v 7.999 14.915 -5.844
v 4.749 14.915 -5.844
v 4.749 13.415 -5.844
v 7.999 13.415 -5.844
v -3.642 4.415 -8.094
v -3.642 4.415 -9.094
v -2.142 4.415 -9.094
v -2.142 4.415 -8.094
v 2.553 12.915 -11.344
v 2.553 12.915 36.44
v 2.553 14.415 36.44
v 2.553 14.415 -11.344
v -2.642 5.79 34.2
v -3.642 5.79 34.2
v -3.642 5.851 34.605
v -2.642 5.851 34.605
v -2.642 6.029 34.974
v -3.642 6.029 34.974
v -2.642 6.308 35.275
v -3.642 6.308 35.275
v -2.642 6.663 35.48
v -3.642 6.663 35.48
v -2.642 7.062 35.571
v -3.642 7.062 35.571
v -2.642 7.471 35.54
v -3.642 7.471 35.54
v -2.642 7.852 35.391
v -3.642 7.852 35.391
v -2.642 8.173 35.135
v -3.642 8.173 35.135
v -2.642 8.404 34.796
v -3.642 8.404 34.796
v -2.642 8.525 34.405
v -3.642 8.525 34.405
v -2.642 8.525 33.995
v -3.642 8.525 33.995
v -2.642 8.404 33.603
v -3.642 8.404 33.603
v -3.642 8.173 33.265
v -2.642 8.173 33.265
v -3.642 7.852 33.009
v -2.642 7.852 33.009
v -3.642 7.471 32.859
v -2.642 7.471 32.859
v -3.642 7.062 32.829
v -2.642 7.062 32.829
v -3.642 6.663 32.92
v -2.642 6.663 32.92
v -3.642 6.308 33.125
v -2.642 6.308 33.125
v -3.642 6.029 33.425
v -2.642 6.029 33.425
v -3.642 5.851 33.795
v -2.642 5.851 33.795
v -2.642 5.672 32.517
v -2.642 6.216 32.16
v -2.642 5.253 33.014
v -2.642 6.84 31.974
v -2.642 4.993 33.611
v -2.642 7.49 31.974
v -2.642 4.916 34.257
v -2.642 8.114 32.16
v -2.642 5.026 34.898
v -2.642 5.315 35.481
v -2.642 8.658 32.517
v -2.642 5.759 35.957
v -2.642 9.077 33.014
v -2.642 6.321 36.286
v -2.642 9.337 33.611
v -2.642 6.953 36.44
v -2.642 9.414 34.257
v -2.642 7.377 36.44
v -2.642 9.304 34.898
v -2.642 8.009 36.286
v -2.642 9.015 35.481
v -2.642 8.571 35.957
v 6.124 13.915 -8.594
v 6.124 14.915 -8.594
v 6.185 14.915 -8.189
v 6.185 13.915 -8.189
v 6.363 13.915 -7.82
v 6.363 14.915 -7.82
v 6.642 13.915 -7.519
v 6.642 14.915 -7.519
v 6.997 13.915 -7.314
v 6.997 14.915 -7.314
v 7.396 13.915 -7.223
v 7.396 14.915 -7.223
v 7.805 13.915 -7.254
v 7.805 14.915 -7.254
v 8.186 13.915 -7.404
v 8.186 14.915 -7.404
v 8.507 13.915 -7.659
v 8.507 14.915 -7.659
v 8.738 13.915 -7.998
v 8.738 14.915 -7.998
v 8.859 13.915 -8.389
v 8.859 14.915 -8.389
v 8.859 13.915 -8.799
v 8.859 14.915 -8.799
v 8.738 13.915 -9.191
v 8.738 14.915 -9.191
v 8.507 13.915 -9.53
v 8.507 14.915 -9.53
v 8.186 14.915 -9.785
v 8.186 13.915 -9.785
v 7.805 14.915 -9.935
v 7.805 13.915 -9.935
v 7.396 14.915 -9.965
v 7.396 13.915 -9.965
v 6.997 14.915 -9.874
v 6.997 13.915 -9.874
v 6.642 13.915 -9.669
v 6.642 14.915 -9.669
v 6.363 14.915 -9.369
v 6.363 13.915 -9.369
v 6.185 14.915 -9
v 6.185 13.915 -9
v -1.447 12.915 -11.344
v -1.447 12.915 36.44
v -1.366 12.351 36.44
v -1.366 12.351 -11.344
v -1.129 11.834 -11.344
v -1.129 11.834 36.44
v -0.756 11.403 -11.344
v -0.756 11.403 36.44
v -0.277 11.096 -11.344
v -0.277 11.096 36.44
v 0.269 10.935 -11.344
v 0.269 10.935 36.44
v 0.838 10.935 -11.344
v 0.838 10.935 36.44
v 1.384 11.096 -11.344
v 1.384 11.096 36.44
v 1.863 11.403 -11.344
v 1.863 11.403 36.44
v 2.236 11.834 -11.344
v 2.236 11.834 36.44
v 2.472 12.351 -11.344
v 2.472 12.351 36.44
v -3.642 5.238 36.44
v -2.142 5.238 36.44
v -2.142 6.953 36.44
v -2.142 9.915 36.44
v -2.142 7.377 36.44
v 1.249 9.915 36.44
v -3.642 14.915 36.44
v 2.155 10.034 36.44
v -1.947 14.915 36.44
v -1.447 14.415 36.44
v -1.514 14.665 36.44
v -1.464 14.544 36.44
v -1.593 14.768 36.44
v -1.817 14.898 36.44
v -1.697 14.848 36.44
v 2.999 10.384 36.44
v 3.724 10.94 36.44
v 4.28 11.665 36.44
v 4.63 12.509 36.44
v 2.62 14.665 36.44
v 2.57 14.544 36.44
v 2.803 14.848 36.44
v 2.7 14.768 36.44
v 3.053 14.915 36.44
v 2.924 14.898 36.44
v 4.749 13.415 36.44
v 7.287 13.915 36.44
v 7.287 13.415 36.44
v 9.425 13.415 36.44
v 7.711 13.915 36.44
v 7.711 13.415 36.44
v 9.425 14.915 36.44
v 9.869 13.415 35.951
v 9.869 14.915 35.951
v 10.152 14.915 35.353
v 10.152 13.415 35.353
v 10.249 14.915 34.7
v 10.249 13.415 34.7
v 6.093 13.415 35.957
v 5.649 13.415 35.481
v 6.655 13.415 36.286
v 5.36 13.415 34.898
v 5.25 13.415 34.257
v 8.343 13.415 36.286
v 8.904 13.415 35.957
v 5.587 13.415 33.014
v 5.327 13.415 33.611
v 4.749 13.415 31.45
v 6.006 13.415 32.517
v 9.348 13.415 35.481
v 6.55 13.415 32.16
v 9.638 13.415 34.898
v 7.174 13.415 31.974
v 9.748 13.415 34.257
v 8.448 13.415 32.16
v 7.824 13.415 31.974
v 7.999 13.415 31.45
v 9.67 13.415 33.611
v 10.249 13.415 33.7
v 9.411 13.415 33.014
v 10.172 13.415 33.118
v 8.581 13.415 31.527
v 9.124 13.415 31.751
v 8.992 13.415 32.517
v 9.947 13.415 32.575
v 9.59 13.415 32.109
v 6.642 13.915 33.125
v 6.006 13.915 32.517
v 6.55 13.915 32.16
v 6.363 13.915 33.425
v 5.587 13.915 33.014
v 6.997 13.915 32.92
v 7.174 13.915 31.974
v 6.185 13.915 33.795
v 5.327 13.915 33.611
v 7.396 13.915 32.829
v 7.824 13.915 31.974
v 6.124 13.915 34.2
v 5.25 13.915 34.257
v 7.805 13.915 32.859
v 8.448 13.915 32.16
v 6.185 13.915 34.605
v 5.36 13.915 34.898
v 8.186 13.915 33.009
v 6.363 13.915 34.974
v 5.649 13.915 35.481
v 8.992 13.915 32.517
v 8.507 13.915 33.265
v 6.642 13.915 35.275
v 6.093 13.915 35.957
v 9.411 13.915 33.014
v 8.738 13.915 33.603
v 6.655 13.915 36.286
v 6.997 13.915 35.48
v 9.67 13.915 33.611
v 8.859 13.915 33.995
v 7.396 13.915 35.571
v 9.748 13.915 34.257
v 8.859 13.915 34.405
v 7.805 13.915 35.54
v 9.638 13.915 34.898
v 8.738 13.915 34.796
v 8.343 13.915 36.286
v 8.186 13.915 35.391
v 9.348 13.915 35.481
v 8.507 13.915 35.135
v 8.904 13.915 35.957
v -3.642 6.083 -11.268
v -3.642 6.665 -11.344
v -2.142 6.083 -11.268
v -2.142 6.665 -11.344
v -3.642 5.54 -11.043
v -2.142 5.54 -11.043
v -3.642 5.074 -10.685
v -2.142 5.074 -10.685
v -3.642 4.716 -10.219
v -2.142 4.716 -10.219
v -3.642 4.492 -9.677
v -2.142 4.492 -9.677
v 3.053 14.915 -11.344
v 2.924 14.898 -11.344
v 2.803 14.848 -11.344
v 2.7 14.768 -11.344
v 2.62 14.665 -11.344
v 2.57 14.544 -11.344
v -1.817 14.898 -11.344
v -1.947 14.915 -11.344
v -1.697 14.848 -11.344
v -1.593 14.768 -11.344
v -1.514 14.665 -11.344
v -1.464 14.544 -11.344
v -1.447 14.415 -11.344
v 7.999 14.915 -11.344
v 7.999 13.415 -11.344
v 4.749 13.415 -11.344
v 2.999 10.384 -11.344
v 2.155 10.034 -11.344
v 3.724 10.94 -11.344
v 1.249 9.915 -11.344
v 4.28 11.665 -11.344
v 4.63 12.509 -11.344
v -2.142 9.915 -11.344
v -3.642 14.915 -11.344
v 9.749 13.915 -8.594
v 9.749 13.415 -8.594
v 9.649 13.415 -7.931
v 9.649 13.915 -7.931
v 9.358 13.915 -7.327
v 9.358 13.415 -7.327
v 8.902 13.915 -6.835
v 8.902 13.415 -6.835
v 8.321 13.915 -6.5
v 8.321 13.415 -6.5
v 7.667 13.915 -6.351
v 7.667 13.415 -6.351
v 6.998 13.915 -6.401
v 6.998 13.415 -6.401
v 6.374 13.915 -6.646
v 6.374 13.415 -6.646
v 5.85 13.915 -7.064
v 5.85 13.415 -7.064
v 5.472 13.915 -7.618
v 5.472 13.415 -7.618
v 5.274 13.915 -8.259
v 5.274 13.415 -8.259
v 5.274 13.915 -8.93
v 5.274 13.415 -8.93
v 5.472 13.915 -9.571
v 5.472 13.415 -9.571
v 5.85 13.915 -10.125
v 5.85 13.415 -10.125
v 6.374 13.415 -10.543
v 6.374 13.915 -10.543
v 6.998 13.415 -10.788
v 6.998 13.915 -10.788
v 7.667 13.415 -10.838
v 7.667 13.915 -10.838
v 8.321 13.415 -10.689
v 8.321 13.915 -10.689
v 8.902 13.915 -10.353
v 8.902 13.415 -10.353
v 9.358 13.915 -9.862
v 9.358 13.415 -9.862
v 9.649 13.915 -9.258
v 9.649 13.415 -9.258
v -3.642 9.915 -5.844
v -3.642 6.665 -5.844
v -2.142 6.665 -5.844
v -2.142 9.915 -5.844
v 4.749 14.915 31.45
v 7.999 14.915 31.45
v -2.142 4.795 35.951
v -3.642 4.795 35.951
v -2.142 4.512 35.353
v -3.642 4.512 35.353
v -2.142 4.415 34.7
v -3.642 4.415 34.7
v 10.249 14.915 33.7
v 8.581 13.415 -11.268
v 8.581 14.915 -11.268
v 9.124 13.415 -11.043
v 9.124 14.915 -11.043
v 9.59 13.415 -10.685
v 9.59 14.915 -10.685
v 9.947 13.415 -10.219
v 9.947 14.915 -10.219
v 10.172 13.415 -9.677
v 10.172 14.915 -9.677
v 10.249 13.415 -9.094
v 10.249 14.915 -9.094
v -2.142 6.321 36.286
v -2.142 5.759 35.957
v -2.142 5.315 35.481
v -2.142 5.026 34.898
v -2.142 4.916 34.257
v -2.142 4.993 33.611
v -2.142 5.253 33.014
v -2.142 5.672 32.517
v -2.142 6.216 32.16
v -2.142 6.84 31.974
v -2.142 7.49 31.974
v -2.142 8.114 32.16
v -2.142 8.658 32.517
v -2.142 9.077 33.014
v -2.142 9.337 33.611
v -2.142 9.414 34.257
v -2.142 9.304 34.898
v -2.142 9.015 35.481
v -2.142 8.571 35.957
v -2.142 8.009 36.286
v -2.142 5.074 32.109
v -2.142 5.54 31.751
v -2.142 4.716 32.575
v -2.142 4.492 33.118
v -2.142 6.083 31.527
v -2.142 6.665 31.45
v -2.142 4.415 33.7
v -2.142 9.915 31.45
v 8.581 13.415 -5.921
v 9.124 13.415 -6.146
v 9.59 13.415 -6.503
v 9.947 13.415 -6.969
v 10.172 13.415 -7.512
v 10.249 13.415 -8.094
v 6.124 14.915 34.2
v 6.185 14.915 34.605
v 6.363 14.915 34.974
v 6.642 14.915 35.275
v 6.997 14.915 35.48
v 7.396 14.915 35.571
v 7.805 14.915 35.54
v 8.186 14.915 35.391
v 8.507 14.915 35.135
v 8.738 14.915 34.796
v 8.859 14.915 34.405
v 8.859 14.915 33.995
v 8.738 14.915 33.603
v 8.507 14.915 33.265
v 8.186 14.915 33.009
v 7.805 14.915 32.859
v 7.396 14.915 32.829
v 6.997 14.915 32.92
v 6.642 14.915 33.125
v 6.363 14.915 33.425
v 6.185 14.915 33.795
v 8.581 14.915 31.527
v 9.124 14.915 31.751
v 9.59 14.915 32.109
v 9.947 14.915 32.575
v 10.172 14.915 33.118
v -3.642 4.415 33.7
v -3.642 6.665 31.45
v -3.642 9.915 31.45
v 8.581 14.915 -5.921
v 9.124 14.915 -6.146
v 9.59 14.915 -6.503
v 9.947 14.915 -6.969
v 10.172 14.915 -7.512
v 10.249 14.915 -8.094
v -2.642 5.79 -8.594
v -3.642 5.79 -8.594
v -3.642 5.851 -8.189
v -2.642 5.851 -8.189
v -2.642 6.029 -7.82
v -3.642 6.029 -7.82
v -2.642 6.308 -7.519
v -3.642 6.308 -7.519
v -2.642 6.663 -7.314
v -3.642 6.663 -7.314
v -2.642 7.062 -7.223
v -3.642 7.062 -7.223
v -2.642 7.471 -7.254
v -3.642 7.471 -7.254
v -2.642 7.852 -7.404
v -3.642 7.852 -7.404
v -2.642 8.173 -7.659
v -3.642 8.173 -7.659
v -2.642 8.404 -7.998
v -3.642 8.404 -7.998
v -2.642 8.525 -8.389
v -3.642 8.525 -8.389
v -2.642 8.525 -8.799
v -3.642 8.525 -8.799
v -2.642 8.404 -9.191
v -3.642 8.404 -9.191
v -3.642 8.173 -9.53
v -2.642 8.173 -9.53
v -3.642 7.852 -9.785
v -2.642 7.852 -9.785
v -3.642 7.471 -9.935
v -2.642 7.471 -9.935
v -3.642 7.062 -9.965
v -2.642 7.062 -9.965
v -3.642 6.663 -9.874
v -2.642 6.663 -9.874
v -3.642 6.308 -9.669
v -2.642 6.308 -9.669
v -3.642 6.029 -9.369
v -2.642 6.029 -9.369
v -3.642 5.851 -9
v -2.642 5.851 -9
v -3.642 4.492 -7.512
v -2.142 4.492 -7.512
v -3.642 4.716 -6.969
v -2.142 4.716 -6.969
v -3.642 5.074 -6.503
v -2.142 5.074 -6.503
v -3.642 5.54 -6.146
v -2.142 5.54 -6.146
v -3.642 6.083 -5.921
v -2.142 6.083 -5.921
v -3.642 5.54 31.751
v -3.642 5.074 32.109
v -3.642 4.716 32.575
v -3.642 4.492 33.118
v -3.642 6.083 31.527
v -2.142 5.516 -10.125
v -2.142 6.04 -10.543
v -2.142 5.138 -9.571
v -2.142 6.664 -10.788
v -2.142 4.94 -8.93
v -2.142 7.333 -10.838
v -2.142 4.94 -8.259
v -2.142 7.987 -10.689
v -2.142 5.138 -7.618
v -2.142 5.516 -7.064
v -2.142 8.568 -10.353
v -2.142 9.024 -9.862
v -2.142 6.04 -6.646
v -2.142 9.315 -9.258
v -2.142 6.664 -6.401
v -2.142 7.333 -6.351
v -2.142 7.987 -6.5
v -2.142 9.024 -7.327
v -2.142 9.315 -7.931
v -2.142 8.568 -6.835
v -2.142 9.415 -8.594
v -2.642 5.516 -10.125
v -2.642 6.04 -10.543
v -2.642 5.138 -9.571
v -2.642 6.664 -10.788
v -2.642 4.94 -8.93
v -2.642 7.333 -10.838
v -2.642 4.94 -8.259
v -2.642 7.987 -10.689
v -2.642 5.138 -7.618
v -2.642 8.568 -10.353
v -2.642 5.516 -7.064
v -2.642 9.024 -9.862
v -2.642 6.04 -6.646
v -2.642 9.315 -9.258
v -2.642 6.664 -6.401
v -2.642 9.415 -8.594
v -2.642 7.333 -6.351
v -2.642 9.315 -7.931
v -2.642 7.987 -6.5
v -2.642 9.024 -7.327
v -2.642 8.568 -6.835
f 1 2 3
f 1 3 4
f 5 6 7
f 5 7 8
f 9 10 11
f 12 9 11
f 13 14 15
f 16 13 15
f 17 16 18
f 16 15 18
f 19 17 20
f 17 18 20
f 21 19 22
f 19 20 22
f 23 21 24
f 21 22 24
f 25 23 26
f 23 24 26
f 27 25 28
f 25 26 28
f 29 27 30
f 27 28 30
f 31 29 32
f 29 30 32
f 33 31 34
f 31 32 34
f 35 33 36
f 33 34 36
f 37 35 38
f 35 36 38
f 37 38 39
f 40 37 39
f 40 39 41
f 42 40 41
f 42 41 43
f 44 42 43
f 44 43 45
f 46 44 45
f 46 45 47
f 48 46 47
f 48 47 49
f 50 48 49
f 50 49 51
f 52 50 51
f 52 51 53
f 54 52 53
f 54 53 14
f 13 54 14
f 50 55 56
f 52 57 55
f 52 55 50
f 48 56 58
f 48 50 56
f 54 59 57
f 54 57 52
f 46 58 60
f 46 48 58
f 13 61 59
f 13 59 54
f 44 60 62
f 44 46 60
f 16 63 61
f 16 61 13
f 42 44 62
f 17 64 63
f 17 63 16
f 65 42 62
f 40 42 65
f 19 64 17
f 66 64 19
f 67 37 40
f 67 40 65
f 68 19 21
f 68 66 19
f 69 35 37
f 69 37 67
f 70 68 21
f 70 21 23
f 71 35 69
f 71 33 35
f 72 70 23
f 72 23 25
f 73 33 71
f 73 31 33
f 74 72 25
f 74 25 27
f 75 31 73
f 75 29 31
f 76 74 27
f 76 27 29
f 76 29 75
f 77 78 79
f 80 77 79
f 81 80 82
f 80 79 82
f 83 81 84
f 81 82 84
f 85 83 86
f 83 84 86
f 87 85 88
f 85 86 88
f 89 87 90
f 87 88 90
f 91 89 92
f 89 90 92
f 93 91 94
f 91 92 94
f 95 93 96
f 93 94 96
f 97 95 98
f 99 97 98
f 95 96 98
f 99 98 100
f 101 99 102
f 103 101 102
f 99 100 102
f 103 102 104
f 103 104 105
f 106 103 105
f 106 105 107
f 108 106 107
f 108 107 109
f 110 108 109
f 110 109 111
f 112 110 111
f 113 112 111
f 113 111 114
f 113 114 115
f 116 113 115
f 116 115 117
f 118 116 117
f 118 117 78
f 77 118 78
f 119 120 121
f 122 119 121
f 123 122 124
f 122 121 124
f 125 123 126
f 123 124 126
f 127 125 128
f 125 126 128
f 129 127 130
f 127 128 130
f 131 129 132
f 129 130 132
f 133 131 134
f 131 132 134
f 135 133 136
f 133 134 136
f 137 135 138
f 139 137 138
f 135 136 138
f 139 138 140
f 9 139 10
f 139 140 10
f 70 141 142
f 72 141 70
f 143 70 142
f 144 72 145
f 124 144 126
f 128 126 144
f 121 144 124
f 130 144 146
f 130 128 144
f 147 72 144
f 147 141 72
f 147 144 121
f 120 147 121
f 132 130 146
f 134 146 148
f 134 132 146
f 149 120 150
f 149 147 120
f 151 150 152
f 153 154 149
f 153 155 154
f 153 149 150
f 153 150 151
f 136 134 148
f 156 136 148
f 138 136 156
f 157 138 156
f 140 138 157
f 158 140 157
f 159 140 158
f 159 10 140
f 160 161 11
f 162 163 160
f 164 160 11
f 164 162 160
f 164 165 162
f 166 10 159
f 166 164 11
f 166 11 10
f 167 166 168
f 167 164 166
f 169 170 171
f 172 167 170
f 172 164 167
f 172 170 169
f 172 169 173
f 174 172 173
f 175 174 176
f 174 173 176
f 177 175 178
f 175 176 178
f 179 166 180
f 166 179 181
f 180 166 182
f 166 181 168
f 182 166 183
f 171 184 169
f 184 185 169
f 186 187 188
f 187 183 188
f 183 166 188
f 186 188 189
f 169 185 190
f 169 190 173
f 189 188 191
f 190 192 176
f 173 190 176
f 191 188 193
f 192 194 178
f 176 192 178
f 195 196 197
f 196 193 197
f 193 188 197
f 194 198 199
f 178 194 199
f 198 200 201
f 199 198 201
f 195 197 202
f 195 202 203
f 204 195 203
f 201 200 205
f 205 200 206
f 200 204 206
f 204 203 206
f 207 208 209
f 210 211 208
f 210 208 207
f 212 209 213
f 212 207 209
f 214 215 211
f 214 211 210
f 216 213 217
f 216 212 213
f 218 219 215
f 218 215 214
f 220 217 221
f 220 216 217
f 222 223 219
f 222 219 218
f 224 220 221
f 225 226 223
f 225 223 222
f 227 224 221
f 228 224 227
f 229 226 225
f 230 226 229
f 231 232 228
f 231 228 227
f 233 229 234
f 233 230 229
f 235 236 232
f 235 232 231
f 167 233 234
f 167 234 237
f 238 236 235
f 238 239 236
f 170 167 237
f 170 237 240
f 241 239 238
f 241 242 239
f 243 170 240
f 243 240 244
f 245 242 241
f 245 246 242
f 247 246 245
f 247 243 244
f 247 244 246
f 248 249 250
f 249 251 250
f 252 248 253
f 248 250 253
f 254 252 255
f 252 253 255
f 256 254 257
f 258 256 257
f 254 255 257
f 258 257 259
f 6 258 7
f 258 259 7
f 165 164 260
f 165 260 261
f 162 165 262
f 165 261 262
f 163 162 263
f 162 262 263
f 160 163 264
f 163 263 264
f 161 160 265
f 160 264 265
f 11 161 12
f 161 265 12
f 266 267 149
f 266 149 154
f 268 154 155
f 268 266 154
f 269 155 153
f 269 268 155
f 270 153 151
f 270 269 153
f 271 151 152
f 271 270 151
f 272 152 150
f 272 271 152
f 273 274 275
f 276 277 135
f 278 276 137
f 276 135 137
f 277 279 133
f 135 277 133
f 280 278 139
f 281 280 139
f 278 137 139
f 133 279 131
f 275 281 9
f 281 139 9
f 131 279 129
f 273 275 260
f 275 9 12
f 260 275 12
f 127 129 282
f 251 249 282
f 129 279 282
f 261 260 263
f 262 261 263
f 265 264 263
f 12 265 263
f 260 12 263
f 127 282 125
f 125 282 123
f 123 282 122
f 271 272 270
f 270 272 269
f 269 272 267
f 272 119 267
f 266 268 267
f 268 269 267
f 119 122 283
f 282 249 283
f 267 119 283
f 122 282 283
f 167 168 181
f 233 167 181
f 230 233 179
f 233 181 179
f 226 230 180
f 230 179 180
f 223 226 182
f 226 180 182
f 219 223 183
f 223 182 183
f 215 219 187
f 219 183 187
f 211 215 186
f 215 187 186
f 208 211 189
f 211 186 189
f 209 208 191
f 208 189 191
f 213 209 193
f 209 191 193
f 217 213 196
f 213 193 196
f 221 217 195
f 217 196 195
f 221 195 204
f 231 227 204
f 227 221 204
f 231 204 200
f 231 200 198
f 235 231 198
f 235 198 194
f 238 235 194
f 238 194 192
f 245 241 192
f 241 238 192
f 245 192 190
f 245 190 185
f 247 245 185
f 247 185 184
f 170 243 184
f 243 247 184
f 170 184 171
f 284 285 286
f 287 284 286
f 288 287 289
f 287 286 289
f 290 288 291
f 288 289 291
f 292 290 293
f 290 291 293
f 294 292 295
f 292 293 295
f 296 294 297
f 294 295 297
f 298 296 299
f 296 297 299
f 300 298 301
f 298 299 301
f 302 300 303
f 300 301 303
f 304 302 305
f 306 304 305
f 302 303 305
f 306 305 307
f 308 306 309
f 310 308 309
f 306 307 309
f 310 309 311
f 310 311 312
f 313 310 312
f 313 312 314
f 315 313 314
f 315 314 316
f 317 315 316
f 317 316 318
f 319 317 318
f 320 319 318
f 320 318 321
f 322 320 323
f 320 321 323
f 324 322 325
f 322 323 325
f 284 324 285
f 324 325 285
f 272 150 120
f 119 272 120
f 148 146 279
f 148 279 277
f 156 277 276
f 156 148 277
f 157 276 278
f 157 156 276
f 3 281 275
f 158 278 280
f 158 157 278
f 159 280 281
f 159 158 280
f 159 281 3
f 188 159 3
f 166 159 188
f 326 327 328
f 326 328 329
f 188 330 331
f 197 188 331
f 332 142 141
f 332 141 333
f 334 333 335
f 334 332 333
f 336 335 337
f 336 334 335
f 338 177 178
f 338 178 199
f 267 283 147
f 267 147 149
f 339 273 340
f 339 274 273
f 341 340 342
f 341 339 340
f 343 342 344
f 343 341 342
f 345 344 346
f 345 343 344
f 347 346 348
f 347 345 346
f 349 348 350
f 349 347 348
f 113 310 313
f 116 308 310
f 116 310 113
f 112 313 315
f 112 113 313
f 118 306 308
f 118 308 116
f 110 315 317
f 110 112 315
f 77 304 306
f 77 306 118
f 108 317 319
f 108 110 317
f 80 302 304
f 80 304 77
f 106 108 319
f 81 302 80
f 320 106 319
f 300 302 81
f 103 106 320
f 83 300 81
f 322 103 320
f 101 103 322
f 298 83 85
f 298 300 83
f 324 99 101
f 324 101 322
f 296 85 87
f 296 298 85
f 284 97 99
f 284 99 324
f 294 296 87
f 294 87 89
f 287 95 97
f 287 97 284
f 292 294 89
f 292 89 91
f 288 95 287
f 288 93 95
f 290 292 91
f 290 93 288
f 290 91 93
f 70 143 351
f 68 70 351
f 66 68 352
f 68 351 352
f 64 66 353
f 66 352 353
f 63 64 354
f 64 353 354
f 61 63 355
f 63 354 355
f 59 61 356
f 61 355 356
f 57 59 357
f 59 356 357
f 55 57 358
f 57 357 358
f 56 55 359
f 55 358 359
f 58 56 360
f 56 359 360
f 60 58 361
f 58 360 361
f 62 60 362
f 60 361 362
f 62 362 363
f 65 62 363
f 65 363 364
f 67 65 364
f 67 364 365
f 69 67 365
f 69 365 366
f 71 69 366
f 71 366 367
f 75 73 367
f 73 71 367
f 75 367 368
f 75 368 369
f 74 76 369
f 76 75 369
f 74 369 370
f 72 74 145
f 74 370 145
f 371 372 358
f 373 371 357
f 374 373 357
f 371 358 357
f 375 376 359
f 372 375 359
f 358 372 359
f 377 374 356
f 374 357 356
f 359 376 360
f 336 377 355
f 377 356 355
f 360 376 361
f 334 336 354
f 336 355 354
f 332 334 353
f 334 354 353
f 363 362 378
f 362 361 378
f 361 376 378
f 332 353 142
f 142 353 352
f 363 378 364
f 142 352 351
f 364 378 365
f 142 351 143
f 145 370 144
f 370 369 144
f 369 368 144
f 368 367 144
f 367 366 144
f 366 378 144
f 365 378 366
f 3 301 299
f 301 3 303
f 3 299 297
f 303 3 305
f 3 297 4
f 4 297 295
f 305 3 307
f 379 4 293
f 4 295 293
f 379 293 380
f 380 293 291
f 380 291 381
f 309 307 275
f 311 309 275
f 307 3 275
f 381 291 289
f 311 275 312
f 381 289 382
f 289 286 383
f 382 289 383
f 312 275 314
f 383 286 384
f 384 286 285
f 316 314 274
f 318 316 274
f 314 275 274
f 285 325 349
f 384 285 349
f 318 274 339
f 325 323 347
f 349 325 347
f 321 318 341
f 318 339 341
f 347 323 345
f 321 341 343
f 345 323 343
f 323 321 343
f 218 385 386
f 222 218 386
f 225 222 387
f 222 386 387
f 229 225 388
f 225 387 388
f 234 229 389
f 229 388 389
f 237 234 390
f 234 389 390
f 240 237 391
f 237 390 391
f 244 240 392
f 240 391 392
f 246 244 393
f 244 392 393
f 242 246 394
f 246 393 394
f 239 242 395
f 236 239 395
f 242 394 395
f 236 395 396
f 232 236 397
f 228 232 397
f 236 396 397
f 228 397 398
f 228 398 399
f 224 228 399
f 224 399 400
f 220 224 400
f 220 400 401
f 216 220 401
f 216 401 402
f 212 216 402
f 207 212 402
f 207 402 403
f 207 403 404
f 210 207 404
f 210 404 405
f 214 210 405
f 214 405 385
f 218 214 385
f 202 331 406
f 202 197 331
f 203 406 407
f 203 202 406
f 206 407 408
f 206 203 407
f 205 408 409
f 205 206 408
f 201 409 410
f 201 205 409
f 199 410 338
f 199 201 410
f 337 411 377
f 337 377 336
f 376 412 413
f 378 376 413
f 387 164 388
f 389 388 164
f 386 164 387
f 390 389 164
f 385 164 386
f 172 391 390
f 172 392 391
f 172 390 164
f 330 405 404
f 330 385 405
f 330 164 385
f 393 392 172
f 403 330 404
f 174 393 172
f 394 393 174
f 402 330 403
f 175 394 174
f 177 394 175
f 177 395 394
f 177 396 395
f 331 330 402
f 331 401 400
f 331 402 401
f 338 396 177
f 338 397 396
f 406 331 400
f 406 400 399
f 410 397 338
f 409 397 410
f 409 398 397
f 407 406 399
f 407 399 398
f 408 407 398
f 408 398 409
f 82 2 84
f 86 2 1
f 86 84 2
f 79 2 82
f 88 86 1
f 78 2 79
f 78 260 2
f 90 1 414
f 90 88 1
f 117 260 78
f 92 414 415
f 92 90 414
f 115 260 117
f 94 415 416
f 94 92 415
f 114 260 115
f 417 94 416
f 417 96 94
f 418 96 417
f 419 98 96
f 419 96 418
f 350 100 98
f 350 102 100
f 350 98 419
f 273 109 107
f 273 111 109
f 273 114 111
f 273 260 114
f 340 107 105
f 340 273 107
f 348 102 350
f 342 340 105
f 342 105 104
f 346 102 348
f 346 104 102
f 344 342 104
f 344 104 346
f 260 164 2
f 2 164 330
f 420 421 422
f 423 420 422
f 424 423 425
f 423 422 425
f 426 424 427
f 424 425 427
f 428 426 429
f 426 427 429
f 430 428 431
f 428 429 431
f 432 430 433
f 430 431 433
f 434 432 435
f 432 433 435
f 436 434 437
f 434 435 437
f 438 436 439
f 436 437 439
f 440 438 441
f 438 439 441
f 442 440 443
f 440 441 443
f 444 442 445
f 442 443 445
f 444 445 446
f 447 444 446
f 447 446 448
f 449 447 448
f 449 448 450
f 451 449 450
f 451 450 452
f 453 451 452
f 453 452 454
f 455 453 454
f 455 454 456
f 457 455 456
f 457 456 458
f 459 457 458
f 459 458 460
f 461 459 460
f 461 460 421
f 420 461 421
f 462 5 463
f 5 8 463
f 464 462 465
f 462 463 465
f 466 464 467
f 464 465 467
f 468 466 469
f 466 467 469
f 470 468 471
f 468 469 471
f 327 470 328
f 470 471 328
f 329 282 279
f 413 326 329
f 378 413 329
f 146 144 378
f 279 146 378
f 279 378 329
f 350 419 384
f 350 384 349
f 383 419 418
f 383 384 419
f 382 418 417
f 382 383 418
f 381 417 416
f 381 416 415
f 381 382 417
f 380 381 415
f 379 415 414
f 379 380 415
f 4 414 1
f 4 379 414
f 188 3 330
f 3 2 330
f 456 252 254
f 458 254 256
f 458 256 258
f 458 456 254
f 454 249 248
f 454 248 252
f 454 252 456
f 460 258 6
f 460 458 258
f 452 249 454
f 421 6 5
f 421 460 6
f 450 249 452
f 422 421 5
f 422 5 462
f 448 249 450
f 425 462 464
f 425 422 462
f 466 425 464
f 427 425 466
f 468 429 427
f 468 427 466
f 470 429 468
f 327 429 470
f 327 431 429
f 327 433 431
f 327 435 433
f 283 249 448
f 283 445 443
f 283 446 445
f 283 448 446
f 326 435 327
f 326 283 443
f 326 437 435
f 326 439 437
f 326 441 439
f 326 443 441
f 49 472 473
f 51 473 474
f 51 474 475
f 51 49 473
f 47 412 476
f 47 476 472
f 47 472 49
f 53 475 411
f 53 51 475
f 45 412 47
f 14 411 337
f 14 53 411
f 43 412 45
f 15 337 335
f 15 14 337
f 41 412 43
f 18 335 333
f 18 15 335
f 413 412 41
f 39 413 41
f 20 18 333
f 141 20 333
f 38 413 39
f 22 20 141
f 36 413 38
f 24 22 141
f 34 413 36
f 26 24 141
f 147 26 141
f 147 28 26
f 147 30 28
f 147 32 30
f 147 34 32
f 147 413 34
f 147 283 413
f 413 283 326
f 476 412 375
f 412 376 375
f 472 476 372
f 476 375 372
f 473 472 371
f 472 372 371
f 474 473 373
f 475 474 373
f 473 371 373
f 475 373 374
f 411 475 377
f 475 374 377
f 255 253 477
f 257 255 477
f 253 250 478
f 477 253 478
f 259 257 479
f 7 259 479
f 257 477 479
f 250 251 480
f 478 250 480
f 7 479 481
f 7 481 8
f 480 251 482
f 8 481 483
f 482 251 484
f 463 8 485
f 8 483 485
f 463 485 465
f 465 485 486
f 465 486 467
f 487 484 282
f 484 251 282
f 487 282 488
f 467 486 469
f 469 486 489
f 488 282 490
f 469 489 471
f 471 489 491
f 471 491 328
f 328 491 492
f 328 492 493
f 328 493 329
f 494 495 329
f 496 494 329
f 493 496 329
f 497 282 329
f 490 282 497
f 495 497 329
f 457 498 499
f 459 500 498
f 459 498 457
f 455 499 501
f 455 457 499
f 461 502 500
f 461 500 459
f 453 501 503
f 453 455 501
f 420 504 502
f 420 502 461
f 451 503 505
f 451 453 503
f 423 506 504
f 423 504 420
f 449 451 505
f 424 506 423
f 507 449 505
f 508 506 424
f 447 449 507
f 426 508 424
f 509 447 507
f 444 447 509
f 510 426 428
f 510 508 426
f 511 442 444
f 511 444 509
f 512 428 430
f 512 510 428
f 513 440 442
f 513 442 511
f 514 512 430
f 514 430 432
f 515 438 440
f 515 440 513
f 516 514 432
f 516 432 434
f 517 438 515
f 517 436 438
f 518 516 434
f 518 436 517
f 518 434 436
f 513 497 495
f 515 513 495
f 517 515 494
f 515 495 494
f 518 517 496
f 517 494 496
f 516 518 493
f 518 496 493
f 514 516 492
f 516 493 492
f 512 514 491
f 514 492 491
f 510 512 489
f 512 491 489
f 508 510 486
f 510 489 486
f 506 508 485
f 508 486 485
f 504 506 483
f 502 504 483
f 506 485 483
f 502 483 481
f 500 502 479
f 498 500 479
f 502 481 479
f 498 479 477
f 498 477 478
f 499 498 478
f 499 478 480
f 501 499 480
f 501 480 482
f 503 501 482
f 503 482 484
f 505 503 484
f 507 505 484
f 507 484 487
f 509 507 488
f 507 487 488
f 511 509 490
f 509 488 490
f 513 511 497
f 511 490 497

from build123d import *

# Parameters (mm, degrees)
SKETCH1_W                       = 8.390953786
SKETCH1_H                       = 32.6942
SKETCH1_H_2                     = 13
SKETCH1_H_3                     = 2.6
BOSS_EXTRUDE1_DEPTH             = 5
CUT_EXTRUDE1_DEPTH              = 51.767483063
CUT_EXTRUDE1_DEPTH_BACK         = 51.767483063
SKETCH3_W                       = 5.5
SKETCH3_H                       = 5.5
SKETCH3_R                       = 1.375
EXTRUDE_BOTTOM_SCREW_PADS_DEPTH = 1.5
SKETCH4_R                       = 2.25
CUT_BOTTOM_COUNTERSINK_DEPTH    = 0.5
SKETCH5_W                       = 5.5
SKETCH5_H                       = 5.5
SKETCH5_R                       = 1.375
EXTRUDE_SIDE_SCREW_PADS_DEPTH   = 1.5
SKETCH6_R                       = 2.25
CUT_SIDE_COUNTERSINK_DEPTH      = 0.5
FILLET_SCREW_PADS_R             = 2.25
FILLET4_R                       = 3.5
FILLET5_R                       = 0.5
SKETCH7_W                       = 13.890953786
SKETCH7_H                       = 10.5
CUT_EXTRUDE4_DEPTH              = 0.51


with BuildPart() as part:
    # Sketch1 → Boss-Extrude1 (new body)
    with BuildSketch(Plane.XZ.offset(-14.914945084)):
        with Locations((0.553417297, 5.002763775)):
            Rectangle(SKETCH1_W, SKETCH1_H)
        with Locations((0.553417297, 27.849863775)):
            Rectangle(SKETCH1_W, SKETCH1_H_2)
        with Locations((0.553417297, 35.649863775)):
            Rectangle(SKETCH1_W, SKETCH1_H_3)
    extrude(amount=BOSS_EXTRUDE1_DEPTH)

    # Sketch2 → Cut-Extrude1 (cut, two sides: drawn at the far end of the back side and taken through both)
    with BuildSketch(Plane(origin=(0, 0, -11.344336225), x_dir=(-1, 0, 0), z_dir=(0, 0, -1)).offset(-CUT_EXTRUDE1_DEPTH_BACK)):
        with BuildLine():
            Line((-2.553417297, 12.914945084), (-2.553417297, 14.914945084))
            Line((-2.553417297, 14.914945084), (1.446582703, 14.914945084))
            Line((1.446582703, 14.914945084), (1.446582703, 12.914945084))
            ThreePointArc((1.446582703, 12.914945084), (-0.553417297, 10.914945084), (-2.553417297, 12.914945084))
        make_face()
    extrude(amount=CUT_EXTRUDE1_DEPTH + CUT_EXTRUDE1_DEPTH_BACK, mode=Mode.SUBTRACT)

    # Sketch3 → Extrude Bottom Screw Pads (add)
    # profile 1 of 2: a face of its own
    with BuildSketch(Plane(origin=(0, 14.914945084, 0), x_dir=(1, 0, 0), z_dir=(0, 1, 0))):
        with Locations((7.49889419, 8.594336225)):
            Rectangle(SKETCH3_W, SKETCH3_H)
        with Locations(Location((7.49889419, 8.594336225, 0), (0, 0, 180))):
            Circle(SKETCH3_R, mode=Mode.SUBTRACT)
    # profile 2 of 2: a face of its own
    with BuildSketch(Plane(origin=(0, 14.914945084, 0), x_dir=(1, 0, 0), z_dir=(0, 1, 0))):
        with Locations((7.49889419, -34.199863775)):
            Rectangle(SKETCH3_W, SKETCH3_H)
        with Locations(Location((7.49889419, -34.199863775, 0), (0, 0, 180))):
            Circle(SKETCH3_R, mode=Mode.SUBTRACT)
    extrude(amount=-EXTRUDE_BOTTOM_SCREW_PADS_DEPTH)

    # Sketch4 → Cut Bottom Countersink (cut)
    with BuildSketch(Plane.XZ.offset(-13.414945084)):
        with Locations((7.49889419, 34.199863775)):
            Circle(SKETCH4_R)
        with Locations((7.49889419, -8.594336225)):
            Circle(SKETCH4_R)
    extrude(amount=-CUT_BOTTOM_COUNTERSINK_DEPTH, mode=Mode.SUBTRACT)

    # Sketch5 → Extrude Side Screw Pads (add)
    # profile 1 of 2: a face of its own
    with BuildSketch(Plane.ZY.offset(3.642059596)):
        with Locations((-8.594336225, 7.164945084)):
            Rectangle(SKETCH5_W, SKETCH5_H)
        with Locations(Location((-8.594336225, 7.164945084, 0), (0, 0, 270))):
            Circle(SKETCH5_R, mode=Mode.SUBTRACT)
    # profile 2 of 2: a face of its own
    with BuildSketch(Plane.ZY.offset(3.642059596)):
        with Locations((34.199863775, 7.164945084)):
            Rectangle(SKETCH5_W, SKETCH5_H)
        with Locations(Location((34.199863775, 7.164945084, 0), (0, 0, 270))):
            Circle(SKETCH5_R, mode=Mode.SUBTRACT)
    extrude(amount=-EXTRUDE_SIDE_SCREW_PADS_DEPTH)

    # Sketch6 → Cut Side Countersink (cut)
    with BuildSketch(Plane(origin=(-2.142059596, 0, 0), x_dir=(0, 0, -1), z_dir=(1, 0, 0))):
        with Locations(Location((-34.199863775, 7.164945084, 0), (0, 0, 90))):
            Circle(SKETCH6_R)
        with Locations(Location((8.594336225, 7.164945084, 0), (0, 0, 90))):
            Circle(SKETCH6_R)
    extrude(amount=-CUT_SIDE_COUNTERSINK_DEPTH, mode=Mode.SUBTRACT)

    # Fillet Screw Pads
    fillet_screw_pads_edges = [part.edges().sort_by_distance(p)[0] for p in [
        (-2.892059596, 4.414945084, 36.949863775),
        (-2.892059596, 4.414945084, 31.449863775),
        (10.24889419, 14.164945084, -11.344336225),
        (10.24889419, 14.164945084, -5.844336225),
        (10.24889419, 14.164945084, 31.449863775),
        (10.24889419, 14.164945084, 36.949863775),
        (-2.892059596, 4.414945084, -5.844336225),
        (-2.892059596, 4.414945084, -11.344336225),
    ]]
    fillet(fillet_screw_pads_edges, radius=FILLET_SCREW_PADS_R)

    # Fillet4
    fillet4_edges = [part.edges().sort_by_distance(p)[0] for p in [
        (4.74889419, 9.914945084, 12.802763775),
    ]]
    fillet(fillet4_edges, radius=FILLET4_R)

    # Fillet5
    fillet5_edges = [part.edges().sort_by_distance(p)[0] for p in [
        (2.553417297, 14.914945084, 12.802763775),
        (-1.446582703, 14.914945084, 12.802763775),
    ]]
    fillet(fillet5_edges, radius=FILLET5_R)

    # Sketch7 → Cut-Extrude4 (cut)
    with BuildSketch(Plane.XY.offset(36.949863775)):
        with Locations((3.303417297, 9.664945084)):
            Rectangle(SKETCH7_W, SKETCH7_H)
    extrude(amount=-CUT_EXTRUDE4_DEPTH, mode=Mode.SUBTRACT)


solid = part.part
